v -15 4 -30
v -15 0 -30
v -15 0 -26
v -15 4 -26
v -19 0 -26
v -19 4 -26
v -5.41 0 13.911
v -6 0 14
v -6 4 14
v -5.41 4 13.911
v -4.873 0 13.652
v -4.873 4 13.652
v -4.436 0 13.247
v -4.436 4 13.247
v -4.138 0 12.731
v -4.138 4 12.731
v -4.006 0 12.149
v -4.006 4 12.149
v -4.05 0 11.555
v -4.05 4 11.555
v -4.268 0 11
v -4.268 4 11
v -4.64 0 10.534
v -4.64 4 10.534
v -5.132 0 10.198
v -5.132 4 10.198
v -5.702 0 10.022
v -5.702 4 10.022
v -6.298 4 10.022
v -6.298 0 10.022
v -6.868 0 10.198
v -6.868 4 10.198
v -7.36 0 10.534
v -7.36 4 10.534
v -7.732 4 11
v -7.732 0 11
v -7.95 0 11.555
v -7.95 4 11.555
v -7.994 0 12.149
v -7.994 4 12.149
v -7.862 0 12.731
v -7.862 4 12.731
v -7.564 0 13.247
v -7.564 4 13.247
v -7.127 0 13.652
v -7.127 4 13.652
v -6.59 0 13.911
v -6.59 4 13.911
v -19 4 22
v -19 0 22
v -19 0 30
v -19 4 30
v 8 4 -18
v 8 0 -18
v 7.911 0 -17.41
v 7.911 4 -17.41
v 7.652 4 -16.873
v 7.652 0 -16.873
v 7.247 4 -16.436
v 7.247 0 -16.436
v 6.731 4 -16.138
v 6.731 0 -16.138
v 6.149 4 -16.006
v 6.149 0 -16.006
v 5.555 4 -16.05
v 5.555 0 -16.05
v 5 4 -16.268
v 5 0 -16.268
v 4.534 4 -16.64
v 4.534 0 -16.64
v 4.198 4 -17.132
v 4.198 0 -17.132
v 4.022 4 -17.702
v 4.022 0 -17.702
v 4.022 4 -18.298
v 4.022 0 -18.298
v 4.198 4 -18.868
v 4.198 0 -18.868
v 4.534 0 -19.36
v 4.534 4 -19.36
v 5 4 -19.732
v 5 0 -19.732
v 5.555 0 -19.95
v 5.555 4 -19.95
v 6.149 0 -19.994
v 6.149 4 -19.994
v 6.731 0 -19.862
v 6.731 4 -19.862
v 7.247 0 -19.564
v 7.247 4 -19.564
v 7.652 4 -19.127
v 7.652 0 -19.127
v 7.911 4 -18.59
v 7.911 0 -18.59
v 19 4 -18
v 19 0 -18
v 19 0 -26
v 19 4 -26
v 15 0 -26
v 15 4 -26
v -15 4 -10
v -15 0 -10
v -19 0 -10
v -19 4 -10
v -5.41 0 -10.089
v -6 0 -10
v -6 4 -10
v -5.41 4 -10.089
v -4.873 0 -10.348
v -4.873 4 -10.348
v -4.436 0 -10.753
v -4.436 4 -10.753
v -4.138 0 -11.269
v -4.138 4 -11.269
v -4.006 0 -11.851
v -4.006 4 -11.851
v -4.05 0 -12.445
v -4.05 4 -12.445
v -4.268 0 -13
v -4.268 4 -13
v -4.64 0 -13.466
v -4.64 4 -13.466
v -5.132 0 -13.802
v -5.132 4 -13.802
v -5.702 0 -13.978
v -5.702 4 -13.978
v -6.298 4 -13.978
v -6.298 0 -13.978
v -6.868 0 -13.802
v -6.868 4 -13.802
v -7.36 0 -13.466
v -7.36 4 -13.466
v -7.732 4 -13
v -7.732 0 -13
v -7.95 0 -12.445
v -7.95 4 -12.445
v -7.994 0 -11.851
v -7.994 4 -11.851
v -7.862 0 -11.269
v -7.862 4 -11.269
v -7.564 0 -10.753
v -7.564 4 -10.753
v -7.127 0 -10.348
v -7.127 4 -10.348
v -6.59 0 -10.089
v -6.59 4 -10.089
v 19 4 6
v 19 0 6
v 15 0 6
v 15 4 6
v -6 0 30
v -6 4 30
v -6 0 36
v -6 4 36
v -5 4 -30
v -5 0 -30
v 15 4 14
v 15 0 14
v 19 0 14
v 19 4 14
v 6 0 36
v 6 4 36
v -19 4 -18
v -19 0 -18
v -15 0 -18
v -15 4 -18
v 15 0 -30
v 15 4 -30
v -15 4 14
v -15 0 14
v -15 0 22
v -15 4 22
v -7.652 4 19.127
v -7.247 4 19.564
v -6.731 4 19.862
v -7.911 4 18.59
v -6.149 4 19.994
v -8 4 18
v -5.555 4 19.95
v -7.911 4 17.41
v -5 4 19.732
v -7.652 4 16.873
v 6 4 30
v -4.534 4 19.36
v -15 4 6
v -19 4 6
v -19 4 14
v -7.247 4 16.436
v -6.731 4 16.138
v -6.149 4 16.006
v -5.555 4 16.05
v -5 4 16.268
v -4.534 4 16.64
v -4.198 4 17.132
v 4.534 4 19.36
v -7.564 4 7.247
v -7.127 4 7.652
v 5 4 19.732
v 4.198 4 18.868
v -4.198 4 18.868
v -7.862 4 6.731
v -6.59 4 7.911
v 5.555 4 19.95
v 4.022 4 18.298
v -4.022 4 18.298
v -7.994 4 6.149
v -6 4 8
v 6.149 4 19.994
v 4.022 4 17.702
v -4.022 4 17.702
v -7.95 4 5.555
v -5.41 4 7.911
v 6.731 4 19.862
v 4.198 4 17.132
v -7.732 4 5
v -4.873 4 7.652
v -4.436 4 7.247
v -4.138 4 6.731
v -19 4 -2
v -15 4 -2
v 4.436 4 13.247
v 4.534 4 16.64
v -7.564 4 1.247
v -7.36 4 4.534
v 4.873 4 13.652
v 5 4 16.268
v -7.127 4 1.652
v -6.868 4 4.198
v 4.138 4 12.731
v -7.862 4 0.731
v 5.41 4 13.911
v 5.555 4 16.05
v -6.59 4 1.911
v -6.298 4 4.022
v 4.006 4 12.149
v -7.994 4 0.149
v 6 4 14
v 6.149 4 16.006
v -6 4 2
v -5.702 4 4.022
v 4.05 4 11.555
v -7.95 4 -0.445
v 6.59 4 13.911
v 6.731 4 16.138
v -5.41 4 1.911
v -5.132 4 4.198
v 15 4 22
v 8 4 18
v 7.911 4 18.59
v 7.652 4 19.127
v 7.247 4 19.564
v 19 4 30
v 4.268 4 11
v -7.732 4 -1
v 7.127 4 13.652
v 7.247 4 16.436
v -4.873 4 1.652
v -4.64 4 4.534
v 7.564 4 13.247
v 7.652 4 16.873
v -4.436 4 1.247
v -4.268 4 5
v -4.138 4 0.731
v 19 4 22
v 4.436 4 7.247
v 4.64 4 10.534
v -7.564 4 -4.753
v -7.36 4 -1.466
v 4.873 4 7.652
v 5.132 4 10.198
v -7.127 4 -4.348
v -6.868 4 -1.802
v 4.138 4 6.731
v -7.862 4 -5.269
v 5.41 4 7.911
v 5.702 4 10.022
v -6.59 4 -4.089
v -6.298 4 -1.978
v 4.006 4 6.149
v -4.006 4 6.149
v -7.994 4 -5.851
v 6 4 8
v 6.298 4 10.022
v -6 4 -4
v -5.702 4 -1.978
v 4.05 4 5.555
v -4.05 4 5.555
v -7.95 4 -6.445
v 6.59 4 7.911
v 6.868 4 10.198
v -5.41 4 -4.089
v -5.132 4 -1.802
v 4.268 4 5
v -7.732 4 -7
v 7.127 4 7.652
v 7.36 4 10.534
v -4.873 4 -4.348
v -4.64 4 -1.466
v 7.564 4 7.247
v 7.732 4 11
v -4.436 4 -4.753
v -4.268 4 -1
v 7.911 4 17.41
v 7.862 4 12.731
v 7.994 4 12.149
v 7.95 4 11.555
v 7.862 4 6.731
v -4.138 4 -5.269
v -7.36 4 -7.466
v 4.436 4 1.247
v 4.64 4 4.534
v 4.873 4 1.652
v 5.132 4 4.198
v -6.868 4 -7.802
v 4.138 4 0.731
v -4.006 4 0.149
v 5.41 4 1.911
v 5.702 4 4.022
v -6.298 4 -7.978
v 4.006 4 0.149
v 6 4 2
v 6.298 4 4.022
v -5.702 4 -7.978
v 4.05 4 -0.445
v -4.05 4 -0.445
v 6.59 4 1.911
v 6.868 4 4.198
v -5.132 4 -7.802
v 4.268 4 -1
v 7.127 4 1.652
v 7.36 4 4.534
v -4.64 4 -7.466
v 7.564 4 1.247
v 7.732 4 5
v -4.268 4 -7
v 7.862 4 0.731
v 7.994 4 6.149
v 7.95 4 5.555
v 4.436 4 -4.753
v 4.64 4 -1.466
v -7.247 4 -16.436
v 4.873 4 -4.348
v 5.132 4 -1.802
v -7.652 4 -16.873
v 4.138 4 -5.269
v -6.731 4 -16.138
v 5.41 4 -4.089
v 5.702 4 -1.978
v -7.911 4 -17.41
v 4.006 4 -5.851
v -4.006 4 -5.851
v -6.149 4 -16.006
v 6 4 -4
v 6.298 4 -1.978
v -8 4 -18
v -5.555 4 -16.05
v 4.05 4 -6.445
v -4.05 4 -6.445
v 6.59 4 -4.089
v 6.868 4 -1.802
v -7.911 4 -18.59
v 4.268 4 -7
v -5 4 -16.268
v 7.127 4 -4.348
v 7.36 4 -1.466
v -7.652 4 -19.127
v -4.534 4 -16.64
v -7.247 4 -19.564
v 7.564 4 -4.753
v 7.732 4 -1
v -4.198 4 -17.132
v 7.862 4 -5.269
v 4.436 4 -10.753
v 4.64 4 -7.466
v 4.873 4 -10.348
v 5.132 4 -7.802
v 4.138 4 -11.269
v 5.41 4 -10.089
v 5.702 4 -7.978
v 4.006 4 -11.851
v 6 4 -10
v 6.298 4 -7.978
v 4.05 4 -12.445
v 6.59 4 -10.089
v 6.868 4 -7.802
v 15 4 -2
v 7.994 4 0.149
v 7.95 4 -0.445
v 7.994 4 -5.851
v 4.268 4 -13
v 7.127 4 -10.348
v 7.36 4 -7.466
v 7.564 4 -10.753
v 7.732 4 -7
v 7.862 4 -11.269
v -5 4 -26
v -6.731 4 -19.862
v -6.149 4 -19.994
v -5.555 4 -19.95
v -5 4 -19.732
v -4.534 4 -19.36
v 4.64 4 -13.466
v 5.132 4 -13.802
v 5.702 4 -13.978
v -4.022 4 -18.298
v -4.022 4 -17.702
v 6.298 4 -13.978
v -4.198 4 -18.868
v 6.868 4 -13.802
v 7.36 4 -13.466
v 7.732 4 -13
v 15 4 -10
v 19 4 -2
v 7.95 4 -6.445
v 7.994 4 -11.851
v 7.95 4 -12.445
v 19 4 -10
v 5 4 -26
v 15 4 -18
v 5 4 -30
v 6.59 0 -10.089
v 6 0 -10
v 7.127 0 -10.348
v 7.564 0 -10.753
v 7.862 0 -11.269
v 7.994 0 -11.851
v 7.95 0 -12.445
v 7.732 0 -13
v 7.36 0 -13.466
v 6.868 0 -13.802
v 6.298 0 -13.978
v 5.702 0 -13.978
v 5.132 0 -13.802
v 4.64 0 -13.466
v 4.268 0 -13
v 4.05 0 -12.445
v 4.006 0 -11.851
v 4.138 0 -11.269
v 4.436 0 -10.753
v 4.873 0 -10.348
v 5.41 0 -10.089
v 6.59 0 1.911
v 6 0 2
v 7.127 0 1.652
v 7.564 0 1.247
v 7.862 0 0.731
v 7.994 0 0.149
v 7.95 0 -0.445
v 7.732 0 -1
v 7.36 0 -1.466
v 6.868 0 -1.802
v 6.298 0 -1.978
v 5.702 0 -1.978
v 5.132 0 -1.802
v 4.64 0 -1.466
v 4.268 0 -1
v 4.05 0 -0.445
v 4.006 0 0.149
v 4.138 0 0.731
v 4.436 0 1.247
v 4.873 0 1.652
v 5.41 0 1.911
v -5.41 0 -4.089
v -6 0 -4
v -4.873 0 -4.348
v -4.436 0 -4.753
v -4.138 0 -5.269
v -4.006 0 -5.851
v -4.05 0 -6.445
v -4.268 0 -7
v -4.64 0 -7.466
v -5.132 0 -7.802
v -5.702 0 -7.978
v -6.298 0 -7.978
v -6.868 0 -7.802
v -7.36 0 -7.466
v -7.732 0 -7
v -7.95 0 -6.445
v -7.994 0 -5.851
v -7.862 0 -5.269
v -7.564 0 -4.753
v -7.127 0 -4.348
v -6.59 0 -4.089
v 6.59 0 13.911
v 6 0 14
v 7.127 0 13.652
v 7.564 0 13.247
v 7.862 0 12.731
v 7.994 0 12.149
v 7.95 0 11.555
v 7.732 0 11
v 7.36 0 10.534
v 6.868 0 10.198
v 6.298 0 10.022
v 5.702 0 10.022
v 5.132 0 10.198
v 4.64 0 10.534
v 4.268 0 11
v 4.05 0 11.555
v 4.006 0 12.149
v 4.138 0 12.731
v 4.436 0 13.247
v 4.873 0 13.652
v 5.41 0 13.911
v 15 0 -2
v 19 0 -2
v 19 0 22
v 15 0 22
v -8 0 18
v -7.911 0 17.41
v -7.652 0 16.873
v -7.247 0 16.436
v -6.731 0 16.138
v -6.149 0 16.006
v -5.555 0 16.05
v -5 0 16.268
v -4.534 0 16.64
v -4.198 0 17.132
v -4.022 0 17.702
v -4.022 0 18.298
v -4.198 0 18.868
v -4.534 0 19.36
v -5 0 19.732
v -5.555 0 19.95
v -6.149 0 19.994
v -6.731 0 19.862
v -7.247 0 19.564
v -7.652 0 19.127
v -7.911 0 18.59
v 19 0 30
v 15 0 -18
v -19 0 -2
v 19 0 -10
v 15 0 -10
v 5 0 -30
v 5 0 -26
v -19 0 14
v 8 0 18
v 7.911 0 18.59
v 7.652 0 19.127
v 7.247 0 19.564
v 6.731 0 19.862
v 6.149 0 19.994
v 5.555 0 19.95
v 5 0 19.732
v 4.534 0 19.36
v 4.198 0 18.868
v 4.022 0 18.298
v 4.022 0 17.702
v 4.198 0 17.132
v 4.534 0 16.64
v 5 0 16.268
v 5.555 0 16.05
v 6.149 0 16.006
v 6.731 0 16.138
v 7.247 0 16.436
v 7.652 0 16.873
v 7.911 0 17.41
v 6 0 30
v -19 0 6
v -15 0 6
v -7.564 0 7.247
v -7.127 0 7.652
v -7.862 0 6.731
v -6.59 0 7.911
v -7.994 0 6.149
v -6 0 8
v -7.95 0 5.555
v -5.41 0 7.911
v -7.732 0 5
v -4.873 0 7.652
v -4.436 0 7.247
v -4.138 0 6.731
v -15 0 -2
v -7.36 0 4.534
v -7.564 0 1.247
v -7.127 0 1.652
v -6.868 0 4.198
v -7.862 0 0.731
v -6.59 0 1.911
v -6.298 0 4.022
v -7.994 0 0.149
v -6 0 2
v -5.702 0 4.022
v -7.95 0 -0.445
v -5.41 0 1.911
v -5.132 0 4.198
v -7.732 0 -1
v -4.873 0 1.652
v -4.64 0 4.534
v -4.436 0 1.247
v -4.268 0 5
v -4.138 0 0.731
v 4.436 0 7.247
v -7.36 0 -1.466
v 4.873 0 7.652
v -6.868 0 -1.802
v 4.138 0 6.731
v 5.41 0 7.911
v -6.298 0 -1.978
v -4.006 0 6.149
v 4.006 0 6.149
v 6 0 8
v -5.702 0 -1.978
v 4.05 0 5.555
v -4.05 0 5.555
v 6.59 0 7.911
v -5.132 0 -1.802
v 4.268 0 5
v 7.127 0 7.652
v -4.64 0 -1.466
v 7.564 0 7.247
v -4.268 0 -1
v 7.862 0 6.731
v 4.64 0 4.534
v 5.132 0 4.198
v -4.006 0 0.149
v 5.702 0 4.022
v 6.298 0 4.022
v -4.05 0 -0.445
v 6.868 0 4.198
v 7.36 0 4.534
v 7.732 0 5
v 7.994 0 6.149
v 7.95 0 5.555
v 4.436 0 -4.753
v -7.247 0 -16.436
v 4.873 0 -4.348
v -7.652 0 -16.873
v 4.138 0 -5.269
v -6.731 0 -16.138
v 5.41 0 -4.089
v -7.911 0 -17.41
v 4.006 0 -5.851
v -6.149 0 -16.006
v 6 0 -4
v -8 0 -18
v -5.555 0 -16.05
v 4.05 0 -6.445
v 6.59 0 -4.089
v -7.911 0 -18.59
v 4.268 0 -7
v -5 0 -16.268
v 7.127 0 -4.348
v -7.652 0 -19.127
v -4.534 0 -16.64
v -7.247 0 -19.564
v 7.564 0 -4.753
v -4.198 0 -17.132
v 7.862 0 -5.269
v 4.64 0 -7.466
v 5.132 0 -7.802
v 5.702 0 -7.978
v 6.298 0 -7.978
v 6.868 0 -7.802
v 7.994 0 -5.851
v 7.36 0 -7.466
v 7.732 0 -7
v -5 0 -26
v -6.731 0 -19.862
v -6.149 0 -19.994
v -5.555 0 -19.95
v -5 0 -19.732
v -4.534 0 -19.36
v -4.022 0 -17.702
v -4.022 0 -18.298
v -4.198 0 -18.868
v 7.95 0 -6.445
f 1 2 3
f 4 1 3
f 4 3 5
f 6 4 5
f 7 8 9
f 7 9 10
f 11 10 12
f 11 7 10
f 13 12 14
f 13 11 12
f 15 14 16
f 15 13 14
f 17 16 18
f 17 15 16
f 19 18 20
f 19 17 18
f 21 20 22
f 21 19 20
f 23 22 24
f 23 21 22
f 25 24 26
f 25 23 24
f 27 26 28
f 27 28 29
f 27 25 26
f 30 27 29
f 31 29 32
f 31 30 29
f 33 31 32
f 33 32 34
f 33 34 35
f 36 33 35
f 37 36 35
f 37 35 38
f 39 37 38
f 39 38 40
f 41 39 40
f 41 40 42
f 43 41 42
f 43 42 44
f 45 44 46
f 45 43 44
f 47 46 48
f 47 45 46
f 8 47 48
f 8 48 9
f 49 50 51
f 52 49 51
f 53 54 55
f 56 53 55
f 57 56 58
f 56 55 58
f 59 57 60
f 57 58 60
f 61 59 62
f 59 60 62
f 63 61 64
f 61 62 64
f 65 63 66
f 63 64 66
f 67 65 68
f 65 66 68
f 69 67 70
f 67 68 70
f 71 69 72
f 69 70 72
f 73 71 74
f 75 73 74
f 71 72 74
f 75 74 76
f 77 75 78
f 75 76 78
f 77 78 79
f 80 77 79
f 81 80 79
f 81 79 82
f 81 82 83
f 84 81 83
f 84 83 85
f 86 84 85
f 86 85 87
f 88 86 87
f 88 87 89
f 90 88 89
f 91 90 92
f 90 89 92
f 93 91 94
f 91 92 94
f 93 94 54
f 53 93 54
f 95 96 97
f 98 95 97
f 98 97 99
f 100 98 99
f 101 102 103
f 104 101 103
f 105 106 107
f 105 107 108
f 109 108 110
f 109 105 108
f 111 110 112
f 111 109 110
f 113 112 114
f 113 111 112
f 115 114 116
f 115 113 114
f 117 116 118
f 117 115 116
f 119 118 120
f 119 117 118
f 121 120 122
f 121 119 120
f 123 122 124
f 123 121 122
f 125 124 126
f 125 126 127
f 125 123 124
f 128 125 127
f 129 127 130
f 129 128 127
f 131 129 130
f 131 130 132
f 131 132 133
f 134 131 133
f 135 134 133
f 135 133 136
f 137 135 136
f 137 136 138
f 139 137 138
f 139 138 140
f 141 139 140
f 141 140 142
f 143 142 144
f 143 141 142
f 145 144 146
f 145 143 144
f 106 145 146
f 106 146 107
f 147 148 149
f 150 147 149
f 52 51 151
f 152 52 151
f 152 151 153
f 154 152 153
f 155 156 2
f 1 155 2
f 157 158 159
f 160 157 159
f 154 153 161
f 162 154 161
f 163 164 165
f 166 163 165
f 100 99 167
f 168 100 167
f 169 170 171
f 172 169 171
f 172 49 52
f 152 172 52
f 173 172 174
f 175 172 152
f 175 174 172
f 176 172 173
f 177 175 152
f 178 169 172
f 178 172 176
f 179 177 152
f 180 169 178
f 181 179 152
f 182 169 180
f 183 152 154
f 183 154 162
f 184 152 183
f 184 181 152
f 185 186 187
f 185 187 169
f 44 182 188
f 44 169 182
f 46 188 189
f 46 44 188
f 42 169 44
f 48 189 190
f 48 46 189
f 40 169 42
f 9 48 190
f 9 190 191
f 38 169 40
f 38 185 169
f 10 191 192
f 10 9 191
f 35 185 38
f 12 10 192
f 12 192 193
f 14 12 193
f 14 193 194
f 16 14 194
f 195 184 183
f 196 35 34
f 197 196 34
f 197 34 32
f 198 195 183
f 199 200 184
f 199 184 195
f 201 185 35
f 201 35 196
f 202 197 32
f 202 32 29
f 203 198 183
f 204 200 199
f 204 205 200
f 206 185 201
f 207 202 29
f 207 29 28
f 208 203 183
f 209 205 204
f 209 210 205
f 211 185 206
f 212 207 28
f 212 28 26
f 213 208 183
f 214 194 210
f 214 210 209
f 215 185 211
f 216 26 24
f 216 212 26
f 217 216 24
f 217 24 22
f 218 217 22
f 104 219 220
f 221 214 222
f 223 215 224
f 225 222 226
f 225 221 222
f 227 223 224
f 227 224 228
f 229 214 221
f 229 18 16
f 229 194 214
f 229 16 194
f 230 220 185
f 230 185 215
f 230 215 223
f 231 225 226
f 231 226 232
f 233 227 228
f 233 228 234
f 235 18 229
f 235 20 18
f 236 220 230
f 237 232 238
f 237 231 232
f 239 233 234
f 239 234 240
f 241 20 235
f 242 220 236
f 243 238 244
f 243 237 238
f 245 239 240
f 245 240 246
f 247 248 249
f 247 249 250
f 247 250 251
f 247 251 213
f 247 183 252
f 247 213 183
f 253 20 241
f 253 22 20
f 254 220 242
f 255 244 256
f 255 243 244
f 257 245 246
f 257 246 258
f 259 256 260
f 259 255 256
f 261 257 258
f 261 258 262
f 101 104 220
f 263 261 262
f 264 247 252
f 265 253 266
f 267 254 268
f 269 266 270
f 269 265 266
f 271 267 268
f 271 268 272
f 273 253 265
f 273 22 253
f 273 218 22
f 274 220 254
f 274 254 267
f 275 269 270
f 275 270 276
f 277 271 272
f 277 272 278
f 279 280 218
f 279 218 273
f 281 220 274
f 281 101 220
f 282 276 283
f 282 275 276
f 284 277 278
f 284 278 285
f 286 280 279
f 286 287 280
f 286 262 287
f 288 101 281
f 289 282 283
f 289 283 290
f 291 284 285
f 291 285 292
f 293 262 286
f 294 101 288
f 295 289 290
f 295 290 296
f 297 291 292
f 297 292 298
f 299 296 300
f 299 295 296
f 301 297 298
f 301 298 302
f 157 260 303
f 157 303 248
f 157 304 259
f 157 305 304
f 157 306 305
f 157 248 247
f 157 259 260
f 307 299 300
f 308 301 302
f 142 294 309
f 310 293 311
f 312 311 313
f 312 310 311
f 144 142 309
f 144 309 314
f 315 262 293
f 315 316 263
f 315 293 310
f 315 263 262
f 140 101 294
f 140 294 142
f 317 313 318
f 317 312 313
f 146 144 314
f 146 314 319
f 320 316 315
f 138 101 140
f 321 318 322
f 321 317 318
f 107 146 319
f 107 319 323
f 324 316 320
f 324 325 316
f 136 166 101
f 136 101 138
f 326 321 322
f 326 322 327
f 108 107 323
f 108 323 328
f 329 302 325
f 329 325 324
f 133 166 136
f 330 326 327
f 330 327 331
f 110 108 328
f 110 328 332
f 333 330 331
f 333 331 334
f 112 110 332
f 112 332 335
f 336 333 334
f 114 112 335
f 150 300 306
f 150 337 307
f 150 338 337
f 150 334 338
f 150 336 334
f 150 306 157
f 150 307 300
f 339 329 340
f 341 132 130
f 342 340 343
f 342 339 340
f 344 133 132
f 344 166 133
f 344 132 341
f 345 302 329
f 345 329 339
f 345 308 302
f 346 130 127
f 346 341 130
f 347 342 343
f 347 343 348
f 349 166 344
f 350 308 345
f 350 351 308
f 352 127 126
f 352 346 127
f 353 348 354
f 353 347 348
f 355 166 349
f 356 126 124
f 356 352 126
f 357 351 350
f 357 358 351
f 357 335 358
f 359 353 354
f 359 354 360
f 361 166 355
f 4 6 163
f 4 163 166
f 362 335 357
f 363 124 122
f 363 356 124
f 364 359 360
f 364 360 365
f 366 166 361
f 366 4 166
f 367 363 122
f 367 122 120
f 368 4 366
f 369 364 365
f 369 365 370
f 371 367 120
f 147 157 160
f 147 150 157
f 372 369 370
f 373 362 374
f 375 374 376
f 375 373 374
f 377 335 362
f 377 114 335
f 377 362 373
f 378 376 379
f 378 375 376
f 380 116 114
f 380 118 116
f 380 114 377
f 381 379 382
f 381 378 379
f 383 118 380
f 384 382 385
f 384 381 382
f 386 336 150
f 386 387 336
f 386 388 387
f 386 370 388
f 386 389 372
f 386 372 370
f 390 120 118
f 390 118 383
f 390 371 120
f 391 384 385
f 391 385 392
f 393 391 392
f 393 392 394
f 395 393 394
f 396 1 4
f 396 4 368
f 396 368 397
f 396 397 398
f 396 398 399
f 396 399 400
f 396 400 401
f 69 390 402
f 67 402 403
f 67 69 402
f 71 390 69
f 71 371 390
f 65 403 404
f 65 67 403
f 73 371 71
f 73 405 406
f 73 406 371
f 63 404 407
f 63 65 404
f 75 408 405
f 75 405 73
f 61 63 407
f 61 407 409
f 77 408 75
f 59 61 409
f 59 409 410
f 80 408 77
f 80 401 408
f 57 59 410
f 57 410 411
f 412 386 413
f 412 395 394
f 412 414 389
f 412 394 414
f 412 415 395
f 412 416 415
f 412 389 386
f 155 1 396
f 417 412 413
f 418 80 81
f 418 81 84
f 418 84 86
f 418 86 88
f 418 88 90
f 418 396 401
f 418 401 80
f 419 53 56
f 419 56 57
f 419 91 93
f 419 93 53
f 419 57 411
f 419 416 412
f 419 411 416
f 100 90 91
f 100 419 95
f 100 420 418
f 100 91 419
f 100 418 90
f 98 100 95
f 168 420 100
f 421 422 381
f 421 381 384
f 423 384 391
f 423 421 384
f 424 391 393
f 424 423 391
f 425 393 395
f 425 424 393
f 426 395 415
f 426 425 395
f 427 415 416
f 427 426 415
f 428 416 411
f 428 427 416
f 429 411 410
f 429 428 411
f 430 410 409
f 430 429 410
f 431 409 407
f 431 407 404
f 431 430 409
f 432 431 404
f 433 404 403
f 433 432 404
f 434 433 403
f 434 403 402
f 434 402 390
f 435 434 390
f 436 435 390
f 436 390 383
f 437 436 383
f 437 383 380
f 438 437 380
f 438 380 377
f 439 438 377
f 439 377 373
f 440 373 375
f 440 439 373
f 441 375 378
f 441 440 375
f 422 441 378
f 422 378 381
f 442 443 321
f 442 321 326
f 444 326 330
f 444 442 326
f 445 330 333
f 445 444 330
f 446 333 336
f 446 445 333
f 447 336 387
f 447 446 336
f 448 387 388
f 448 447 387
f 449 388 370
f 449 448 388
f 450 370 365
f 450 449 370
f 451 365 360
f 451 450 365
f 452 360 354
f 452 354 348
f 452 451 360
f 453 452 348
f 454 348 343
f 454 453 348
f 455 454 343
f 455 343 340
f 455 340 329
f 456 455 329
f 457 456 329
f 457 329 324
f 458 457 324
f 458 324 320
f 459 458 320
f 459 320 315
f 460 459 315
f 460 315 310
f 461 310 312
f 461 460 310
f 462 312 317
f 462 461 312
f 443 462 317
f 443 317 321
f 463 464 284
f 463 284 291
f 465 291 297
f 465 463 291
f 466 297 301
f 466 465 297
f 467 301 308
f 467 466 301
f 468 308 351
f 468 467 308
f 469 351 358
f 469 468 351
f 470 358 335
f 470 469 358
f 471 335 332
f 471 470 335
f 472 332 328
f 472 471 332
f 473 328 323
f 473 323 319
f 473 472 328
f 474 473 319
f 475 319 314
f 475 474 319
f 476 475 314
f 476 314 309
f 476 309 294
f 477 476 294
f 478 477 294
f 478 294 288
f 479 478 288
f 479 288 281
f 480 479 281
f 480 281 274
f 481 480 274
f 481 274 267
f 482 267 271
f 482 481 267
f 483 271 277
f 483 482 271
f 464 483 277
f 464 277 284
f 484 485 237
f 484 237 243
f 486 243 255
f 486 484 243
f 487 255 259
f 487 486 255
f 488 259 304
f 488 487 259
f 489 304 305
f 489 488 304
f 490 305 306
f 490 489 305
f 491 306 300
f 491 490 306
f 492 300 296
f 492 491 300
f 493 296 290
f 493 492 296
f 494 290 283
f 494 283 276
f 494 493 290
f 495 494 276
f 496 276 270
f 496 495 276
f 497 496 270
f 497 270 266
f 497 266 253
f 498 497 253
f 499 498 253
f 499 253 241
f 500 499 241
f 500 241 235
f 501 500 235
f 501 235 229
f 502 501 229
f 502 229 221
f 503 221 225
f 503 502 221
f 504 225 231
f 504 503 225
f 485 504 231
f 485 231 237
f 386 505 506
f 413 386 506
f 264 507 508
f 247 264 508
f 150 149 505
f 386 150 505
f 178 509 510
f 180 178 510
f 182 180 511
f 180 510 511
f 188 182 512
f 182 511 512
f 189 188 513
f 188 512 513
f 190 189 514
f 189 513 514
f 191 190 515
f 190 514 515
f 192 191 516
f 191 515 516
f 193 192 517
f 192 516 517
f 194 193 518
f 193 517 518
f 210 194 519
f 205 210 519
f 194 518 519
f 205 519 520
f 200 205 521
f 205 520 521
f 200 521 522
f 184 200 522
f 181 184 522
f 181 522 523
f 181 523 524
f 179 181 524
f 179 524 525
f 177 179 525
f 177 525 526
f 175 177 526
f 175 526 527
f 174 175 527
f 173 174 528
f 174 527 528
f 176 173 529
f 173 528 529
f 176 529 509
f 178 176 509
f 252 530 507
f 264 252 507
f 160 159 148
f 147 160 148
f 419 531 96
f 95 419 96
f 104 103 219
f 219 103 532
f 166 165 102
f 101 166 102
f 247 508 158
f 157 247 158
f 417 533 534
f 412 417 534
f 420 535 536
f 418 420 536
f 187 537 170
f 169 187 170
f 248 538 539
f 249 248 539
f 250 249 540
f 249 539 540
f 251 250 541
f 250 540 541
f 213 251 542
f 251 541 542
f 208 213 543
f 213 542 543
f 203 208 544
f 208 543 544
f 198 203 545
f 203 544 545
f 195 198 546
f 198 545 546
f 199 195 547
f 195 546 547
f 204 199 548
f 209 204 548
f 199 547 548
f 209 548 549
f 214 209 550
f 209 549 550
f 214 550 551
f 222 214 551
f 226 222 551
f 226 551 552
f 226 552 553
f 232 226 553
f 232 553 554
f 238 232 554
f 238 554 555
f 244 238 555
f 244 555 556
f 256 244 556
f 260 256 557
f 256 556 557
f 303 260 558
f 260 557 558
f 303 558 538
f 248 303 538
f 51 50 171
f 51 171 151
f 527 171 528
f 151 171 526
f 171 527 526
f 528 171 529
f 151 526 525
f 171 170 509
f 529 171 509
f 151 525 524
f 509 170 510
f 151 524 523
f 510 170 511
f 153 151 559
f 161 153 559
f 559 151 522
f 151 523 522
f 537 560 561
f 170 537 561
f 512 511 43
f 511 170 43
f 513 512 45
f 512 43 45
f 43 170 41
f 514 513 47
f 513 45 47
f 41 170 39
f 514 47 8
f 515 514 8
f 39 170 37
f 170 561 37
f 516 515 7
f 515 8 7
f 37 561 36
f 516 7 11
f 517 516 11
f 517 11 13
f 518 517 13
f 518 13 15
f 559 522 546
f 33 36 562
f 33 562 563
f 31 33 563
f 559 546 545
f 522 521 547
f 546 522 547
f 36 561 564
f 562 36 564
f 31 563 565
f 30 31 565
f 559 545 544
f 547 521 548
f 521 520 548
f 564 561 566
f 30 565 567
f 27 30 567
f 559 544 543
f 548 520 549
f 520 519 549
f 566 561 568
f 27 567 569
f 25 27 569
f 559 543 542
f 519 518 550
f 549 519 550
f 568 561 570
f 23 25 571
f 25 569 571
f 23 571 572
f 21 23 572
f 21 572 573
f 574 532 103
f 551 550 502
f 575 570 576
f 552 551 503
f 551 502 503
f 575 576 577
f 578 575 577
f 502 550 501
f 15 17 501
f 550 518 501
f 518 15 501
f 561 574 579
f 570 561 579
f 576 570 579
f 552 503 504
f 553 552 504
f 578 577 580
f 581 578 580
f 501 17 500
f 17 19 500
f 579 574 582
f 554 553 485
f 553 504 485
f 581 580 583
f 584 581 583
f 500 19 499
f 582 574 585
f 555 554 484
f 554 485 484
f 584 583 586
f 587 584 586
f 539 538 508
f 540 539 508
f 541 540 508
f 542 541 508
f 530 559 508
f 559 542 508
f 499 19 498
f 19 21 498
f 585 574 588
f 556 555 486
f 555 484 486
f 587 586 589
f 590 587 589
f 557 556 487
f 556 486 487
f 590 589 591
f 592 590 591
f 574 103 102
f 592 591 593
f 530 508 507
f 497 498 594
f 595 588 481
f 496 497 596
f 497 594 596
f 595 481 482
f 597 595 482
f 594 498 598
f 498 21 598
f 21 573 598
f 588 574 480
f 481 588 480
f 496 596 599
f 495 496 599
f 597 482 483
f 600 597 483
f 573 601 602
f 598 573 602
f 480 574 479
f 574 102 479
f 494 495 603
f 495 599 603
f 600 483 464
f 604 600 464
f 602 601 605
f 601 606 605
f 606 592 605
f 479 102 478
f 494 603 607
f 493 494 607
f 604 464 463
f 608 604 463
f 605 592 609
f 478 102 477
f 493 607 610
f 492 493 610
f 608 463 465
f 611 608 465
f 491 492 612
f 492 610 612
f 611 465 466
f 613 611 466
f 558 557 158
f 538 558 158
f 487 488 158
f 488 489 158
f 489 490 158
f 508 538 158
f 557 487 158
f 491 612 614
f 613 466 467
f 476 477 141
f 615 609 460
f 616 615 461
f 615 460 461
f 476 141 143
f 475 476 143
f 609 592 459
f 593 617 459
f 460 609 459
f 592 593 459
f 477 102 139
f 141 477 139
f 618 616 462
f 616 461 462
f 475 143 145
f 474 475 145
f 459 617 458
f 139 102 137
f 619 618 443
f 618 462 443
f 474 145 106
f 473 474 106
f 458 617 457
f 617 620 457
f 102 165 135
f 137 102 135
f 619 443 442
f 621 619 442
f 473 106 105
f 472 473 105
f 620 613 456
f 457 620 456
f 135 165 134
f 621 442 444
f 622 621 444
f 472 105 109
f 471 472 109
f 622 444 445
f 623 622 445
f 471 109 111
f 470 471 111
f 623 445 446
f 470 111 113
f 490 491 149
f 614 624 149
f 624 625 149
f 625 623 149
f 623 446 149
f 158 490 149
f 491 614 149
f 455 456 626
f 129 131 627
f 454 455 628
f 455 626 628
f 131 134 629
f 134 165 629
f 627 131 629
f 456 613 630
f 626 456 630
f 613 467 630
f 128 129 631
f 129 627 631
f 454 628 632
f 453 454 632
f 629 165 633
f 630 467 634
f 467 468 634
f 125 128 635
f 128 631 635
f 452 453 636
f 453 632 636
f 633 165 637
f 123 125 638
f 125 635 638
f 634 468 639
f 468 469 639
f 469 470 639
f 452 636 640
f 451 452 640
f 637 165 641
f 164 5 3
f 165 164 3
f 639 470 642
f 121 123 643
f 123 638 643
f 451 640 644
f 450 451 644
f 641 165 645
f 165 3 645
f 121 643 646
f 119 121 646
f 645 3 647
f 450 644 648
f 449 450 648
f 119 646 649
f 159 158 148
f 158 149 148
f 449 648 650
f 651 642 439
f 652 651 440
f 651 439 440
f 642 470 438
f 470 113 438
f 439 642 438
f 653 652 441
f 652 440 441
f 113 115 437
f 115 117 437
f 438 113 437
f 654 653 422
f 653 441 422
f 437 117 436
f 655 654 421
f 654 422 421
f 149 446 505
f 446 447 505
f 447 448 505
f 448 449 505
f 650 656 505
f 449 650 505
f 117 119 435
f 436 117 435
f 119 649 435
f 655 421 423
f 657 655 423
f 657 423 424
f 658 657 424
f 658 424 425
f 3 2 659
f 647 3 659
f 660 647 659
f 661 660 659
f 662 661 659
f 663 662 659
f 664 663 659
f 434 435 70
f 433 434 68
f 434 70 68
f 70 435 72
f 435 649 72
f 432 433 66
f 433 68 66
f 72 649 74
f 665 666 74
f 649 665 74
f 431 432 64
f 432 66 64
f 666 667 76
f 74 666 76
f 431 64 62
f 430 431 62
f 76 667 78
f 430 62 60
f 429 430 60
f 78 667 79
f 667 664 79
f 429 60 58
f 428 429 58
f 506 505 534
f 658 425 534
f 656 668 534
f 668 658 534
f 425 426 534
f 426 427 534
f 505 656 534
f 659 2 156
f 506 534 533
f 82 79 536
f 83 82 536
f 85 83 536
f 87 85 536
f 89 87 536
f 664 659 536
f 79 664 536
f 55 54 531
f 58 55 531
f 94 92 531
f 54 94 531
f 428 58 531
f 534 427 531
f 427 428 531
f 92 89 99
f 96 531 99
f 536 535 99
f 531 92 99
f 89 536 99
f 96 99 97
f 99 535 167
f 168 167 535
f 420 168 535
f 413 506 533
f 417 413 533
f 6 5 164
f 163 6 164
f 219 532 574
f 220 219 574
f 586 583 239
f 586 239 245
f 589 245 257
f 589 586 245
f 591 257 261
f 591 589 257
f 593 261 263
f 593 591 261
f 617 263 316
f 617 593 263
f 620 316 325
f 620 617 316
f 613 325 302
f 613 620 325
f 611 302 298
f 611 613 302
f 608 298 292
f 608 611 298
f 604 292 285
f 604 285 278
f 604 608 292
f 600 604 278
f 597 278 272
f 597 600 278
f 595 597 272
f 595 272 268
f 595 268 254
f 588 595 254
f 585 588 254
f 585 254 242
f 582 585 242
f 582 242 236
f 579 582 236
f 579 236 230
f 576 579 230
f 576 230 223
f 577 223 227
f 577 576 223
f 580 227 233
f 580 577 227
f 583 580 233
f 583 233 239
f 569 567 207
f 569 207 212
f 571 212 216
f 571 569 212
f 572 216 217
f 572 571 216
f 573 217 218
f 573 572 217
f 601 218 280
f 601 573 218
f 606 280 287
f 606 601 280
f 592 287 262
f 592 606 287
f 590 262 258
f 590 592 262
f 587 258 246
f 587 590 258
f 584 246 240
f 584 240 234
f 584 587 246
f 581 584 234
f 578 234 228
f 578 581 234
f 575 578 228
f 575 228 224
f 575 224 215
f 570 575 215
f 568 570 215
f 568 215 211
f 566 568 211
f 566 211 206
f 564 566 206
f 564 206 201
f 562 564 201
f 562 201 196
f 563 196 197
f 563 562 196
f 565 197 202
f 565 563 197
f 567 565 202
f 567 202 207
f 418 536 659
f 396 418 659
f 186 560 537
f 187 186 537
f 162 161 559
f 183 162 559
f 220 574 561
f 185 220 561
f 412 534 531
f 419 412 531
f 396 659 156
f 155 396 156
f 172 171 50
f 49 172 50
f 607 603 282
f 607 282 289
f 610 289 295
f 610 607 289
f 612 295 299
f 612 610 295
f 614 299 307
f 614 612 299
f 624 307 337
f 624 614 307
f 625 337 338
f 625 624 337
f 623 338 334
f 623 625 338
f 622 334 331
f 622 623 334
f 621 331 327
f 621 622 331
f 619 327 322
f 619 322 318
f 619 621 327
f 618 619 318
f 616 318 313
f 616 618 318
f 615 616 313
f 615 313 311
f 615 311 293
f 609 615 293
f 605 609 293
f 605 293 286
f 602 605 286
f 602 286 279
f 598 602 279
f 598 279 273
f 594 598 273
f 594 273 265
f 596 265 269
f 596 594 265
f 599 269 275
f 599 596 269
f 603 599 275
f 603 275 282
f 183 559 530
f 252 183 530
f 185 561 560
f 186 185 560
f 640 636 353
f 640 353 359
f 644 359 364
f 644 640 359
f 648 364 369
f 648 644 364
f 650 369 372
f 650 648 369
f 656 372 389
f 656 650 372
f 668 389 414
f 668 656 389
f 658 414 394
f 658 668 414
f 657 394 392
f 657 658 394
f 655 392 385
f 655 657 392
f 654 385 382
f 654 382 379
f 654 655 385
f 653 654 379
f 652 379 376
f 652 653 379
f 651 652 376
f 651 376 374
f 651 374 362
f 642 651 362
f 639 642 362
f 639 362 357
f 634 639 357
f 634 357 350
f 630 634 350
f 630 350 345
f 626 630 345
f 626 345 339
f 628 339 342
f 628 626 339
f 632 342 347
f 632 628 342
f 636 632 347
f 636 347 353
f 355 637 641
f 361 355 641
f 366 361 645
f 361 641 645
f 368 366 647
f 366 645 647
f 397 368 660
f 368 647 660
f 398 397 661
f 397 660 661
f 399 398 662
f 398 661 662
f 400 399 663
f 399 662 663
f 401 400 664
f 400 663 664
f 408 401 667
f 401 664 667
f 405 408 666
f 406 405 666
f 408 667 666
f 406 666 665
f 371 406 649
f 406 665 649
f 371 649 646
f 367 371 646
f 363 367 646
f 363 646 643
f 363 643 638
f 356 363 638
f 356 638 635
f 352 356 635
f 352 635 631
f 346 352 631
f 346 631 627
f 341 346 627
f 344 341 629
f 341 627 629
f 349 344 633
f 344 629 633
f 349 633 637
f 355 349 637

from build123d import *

# Parameters (mm, degrees)
SKETCH1_R           = 2
BOSS_EXTRUDE1_DEPTH = 4


with BuildPart() as part:
    # Sketch1 → Boss-Extrude1 (new body)
    with BuildSketch(Plane(origin=(0, 0, 0), x_dir=(1, 0, 0), z_dir=(0, 1, 0))):
        Polygon((5, 26), (-5, 26), (-5, 30), (-15, 30), (-15, 26), (-19, 26), (-19, 18), (-15, 18), (-15, 10), (-19, 10), (-19, 2), (-15, 2), (-15, -6), (-19, -6), (-19, -14), (-15, -14), (-15, -22), (-19, -22), (-19, -30), (-15, -30), (-6, -30), (-6, -36), (6, -36), (6, -30), (15, -30), (19, -30), (19, -22), (15, -22), (15, -14), (19, -14), (19, -6), (15, -6), (15, 2), (19, 2), (19, 10), (15, 10), (15, 18), (19, 18), (19, 26), (15, 26), (15, 30), (5, 30), align=None)
        with BuildLine():
            ThreePointArc((-4, -18), (-6, -20), (-8, -18))
            ThreePointArc((-8, -18), (-6, -16), (-4, -18))
        make_face(mode=Mode.SUBTRACT)
        with Locations(Location((-6, -12, 0), (0, 0, 270))):
            Circle(SKETCH1_R, mode=Mode.SUBTRACT)
        with Locations(Location((-6, -6, 0), (0, 0, 270))):
            Circle(SKETCH1_R, mode=Mode.SUBTRACT)
        with BuildLine():
            ThreePointArc((4, -18), (6, -16), (8, -18))
            ThreePointArc((8, -18), (6, -20), (4, -18))
        make_face(mode=Mode.SUBTRACT)
        with Locations(Location((6, -12, 0), (0, 0, 270))):
            Circle(SKETCH1_R, mode=Mode.SUBTRACT)
        with Locations(Location((6, -6, 0), (0, 0, 270))):
            Circle(SKETCH1_R, mode=Mode.SUBTRACT)
        with Locations(Location((-6, 0, 0), (0, 0, 270))):
            Circle(SKETCH1_R, mode=Mode.SUBTRACT)
        with Locations(Location((-6, 6, 0), (0, 0, 270))):
            Circle(SKETCH1_R, mode=Mode.SUBTRACT)
        with Locations(Location((-6, 12, 0), (0, 0, 270))):
            Circle(SKETCH1_R, mode=Mode.SUBTRACT)
        with BuildLine():
            ThreePointArc((-4, 18), (-6, 16), (-8, 18))
            ThreePointArc((-8, 18), (-6, 20), (-4, 18))
        make_face(mode=Mode.SUBTRACT)
        with Locations(Location((6, 0, 0), (0, 0, 270))):
            Circle(SKETCH1_R, mode=Mode.SUBTRACT)
        with Locations(Location((6, 6, 0), (0, 0, 270))):
            Circle(SKETCH1_R, mode=Mode.SUBTRACT)
        with Locations(Location((6, 12, 0), (0, 0, 270))):
            Circle(SKETCH1_R, mode=Mode.SUBTRACT)
        with BuildLine():
            ThreePointArc((4, 18), (6, 20), (8, 18))
            ThreePointArc((8, 18), (6, 16), (4, 18))
        make_face(mode=Mode.SUBTRACT)
    extrude(amount=BOSS_EXTRUDE1_DEPTH)


solid = part.part
